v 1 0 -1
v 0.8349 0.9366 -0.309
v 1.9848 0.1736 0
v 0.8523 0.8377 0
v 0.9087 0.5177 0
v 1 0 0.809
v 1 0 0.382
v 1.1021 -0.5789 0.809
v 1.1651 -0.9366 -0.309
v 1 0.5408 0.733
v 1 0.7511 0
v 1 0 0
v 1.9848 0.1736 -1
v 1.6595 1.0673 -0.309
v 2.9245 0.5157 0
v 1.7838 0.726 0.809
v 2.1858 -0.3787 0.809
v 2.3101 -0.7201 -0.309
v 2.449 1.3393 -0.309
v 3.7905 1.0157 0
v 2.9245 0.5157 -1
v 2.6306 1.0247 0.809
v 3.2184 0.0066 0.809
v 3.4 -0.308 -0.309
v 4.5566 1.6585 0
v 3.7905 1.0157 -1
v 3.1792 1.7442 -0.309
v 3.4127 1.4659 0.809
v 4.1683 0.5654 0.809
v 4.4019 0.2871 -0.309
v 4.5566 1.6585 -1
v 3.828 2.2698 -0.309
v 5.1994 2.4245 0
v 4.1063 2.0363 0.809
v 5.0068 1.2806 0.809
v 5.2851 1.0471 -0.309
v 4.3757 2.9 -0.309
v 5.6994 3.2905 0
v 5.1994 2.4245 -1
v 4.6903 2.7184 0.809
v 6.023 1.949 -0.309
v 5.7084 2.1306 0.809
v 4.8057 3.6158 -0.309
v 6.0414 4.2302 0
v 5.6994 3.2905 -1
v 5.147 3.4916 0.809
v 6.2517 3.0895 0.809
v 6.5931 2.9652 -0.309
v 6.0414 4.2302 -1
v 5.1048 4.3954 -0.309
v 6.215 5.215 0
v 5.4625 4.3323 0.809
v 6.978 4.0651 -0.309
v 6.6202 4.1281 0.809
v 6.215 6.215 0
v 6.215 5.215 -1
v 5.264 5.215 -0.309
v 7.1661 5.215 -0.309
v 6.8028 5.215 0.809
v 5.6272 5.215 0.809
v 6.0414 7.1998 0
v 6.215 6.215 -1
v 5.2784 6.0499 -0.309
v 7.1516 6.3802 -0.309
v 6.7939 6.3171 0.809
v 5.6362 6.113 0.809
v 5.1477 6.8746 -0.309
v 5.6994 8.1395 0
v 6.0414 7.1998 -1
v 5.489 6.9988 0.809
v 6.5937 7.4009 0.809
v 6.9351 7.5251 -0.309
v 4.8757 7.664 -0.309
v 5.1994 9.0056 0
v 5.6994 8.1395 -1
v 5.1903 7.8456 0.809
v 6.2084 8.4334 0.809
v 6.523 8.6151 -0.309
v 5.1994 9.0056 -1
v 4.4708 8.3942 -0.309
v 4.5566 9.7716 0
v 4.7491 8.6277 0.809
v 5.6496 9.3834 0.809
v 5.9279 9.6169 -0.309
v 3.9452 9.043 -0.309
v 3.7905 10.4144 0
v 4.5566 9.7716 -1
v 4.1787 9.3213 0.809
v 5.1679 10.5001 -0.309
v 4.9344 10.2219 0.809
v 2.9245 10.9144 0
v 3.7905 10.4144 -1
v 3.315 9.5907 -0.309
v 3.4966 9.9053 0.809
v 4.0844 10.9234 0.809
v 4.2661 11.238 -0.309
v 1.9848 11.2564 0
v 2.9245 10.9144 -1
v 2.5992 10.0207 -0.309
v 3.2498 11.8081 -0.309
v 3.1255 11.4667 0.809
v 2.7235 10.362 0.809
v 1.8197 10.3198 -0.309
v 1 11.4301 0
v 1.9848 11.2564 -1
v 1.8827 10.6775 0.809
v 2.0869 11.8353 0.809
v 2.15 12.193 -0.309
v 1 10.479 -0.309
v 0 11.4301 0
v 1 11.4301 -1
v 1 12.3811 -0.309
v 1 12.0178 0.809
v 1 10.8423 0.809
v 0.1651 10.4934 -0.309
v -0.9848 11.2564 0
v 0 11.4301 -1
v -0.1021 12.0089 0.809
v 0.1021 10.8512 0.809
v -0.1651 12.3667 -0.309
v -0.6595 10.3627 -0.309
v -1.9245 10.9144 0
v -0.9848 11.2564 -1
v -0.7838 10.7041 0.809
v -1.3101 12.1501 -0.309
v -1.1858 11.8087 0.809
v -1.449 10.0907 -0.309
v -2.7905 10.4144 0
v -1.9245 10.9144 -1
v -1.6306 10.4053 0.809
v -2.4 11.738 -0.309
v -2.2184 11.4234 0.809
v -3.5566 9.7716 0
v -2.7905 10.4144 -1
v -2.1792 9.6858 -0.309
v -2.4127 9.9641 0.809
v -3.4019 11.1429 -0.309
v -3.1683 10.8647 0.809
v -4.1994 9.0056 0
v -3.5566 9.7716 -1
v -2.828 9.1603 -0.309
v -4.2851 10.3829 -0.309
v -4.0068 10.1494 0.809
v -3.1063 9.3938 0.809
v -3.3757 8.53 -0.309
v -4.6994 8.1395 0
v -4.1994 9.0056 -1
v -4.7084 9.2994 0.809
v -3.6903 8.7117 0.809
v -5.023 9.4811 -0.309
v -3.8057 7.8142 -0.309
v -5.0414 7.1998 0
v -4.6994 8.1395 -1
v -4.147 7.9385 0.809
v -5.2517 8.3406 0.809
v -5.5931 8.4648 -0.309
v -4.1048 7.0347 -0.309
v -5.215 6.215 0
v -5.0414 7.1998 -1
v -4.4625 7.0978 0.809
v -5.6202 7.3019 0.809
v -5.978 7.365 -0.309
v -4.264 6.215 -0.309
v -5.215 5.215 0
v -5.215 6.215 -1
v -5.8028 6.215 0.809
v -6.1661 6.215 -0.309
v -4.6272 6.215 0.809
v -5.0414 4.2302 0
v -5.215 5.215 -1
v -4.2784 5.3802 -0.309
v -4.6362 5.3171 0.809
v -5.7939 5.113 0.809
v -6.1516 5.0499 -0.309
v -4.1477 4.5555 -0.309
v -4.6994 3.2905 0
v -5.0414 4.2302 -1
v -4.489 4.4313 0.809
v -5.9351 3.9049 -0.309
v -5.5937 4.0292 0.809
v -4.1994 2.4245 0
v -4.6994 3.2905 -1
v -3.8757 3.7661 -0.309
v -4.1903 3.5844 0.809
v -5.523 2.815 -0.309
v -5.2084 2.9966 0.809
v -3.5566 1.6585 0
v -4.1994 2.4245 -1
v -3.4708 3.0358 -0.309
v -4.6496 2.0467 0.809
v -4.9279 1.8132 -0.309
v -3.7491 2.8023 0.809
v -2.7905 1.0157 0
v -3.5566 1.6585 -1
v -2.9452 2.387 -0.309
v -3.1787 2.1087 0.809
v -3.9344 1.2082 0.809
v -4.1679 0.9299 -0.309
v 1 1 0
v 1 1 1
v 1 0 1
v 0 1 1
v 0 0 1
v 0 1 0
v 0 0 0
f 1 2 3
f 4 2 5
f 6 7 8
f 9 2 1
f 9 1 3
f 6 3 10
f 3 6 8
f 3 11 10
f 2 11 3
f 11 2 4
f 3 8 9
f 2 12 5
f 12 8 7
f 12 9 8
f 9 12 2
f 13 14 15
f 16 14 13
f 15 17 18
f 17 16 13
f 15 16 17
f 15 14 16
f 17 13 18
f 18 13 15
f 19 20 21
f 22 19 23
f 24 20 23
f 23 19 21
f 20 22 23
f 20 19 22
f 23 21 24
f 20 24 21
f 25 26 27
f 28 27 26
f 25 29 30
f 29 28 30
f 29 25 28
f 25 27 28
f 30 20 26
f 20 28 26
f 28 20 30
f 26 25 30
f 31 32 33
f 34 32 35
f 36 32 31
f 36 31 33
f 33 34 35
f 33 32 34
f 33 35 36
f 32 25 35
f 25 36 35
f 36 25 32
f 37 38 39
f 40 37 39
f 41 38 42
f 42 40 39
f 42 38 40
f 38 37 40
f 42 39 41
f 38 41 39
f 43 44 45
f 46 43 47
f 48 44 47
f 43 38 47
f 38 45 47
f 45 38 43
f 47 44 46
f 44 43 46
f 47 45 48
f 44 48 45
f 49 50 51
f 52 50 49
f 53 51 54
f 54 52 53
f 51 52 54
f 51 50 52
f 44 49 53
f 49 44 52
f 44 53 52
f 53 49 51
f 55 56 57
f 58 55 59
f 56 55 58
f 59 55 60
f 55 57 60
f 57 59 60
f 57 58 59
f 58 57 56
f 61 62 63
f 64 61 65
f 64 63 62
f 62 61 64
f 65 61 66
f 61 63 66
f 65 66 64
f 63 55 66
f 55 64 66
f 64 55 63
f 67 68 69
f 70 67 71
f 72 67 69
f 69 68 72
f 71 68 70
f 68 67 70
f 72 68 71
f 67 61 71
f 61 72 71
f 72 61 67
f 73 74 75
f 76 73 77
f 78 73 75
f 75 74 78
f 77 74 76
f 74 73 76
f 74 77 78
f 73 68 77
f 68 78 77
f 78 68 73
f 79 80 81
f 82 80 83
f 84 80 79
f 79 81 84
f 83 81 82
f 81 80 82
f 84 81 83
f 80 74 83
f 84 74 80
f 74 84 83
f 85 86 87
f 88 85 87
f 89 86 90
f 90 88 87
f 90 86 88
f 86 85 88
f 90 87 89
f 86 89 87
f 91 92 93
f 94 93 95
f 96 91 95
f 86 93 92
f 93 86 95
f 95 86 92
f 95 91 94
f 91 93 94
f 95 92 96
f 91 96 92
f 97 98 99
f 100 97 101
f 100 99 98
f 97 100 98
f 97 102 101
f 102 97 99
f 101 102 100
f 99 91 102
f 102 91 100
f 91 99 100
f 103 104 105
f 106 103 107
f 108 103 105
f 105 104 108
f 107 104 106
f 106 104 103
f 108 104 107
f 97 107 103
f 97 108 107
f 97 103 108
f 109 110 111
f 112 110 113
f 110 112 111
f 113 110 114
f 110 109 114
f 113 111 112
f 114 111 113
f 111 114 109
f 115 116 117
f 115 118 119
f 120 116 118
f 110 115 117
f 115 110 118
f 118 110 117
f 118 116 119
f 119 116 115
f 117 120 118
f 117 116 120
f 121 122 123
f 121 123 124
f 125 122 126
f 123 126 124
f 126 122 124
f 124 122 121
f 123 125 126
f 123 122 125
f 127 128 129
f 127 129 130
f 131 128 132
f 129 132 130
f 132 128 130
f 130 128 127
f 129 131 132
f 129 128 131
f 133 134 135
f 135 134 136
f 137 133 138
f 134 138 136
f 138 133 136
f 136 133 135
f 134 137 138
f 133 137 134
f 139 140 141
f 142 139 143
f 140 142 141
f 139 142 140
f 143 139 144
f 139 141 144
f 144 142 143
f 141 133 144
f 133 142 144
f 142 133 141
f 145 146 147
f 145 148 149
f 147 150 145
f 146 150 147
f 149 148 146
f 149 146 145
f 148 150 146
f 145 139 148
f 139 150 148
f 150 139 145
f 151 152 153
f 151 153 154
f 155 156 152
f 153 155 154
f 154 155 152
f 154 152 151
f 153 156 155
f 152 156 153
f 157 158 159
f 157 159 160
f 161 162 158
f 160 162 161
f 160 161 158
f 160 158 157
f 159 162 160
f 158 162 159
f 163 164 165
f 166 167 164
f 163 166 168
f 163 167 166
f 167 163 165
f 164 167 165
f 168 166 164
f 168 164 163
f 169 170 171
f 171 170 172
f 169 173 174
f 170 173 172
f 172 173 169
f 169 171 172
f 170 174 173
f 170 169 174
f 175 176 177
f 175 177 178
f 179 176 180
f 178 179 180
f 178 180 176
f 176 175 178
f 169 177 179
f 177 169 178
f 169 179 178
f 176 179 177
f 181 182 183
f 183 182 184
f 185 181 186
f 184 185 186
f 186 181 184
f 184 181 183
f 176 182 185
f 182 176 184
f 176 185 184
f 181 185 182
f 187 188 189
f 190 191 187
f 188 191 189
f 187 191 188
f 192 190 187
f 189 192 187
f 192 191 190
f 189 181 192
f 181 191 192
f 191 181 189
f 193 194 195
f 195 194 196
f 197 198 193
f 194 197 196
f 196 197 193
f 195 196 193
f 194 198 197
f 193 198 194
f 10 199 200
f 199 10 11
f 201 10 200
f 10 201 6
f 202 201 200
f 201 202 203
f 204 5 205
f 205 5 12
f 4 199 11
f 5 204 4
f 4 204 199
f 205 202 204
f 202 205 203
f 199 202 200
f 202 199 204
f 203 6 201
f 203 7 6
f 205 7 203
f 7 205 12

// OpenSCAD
// Incremental positions
function segment_pos(l,a,i) = 0;
l=1.0;
a=10;
M=[
	[ cos(a),-sin(a),0,l]
	,[sin(a),cos(a),0,0]
	,[0,0,1,0]
	,[0,0,0,1]
];
function powm(M,i) = i>1?M*powm(M,i-1):M;
M2=powm(M,2);
echo(str("M:",M));
echo(str("M2:",M2));
cube();
for(i=[1:32]) assign(MP=powm(M,i)) multmatrix(m=MP) {
  echo(str("M^",i,": ",MP));
  rotate([0,90,0]) cylinder(r1=1,r2=0,h=1);
}
